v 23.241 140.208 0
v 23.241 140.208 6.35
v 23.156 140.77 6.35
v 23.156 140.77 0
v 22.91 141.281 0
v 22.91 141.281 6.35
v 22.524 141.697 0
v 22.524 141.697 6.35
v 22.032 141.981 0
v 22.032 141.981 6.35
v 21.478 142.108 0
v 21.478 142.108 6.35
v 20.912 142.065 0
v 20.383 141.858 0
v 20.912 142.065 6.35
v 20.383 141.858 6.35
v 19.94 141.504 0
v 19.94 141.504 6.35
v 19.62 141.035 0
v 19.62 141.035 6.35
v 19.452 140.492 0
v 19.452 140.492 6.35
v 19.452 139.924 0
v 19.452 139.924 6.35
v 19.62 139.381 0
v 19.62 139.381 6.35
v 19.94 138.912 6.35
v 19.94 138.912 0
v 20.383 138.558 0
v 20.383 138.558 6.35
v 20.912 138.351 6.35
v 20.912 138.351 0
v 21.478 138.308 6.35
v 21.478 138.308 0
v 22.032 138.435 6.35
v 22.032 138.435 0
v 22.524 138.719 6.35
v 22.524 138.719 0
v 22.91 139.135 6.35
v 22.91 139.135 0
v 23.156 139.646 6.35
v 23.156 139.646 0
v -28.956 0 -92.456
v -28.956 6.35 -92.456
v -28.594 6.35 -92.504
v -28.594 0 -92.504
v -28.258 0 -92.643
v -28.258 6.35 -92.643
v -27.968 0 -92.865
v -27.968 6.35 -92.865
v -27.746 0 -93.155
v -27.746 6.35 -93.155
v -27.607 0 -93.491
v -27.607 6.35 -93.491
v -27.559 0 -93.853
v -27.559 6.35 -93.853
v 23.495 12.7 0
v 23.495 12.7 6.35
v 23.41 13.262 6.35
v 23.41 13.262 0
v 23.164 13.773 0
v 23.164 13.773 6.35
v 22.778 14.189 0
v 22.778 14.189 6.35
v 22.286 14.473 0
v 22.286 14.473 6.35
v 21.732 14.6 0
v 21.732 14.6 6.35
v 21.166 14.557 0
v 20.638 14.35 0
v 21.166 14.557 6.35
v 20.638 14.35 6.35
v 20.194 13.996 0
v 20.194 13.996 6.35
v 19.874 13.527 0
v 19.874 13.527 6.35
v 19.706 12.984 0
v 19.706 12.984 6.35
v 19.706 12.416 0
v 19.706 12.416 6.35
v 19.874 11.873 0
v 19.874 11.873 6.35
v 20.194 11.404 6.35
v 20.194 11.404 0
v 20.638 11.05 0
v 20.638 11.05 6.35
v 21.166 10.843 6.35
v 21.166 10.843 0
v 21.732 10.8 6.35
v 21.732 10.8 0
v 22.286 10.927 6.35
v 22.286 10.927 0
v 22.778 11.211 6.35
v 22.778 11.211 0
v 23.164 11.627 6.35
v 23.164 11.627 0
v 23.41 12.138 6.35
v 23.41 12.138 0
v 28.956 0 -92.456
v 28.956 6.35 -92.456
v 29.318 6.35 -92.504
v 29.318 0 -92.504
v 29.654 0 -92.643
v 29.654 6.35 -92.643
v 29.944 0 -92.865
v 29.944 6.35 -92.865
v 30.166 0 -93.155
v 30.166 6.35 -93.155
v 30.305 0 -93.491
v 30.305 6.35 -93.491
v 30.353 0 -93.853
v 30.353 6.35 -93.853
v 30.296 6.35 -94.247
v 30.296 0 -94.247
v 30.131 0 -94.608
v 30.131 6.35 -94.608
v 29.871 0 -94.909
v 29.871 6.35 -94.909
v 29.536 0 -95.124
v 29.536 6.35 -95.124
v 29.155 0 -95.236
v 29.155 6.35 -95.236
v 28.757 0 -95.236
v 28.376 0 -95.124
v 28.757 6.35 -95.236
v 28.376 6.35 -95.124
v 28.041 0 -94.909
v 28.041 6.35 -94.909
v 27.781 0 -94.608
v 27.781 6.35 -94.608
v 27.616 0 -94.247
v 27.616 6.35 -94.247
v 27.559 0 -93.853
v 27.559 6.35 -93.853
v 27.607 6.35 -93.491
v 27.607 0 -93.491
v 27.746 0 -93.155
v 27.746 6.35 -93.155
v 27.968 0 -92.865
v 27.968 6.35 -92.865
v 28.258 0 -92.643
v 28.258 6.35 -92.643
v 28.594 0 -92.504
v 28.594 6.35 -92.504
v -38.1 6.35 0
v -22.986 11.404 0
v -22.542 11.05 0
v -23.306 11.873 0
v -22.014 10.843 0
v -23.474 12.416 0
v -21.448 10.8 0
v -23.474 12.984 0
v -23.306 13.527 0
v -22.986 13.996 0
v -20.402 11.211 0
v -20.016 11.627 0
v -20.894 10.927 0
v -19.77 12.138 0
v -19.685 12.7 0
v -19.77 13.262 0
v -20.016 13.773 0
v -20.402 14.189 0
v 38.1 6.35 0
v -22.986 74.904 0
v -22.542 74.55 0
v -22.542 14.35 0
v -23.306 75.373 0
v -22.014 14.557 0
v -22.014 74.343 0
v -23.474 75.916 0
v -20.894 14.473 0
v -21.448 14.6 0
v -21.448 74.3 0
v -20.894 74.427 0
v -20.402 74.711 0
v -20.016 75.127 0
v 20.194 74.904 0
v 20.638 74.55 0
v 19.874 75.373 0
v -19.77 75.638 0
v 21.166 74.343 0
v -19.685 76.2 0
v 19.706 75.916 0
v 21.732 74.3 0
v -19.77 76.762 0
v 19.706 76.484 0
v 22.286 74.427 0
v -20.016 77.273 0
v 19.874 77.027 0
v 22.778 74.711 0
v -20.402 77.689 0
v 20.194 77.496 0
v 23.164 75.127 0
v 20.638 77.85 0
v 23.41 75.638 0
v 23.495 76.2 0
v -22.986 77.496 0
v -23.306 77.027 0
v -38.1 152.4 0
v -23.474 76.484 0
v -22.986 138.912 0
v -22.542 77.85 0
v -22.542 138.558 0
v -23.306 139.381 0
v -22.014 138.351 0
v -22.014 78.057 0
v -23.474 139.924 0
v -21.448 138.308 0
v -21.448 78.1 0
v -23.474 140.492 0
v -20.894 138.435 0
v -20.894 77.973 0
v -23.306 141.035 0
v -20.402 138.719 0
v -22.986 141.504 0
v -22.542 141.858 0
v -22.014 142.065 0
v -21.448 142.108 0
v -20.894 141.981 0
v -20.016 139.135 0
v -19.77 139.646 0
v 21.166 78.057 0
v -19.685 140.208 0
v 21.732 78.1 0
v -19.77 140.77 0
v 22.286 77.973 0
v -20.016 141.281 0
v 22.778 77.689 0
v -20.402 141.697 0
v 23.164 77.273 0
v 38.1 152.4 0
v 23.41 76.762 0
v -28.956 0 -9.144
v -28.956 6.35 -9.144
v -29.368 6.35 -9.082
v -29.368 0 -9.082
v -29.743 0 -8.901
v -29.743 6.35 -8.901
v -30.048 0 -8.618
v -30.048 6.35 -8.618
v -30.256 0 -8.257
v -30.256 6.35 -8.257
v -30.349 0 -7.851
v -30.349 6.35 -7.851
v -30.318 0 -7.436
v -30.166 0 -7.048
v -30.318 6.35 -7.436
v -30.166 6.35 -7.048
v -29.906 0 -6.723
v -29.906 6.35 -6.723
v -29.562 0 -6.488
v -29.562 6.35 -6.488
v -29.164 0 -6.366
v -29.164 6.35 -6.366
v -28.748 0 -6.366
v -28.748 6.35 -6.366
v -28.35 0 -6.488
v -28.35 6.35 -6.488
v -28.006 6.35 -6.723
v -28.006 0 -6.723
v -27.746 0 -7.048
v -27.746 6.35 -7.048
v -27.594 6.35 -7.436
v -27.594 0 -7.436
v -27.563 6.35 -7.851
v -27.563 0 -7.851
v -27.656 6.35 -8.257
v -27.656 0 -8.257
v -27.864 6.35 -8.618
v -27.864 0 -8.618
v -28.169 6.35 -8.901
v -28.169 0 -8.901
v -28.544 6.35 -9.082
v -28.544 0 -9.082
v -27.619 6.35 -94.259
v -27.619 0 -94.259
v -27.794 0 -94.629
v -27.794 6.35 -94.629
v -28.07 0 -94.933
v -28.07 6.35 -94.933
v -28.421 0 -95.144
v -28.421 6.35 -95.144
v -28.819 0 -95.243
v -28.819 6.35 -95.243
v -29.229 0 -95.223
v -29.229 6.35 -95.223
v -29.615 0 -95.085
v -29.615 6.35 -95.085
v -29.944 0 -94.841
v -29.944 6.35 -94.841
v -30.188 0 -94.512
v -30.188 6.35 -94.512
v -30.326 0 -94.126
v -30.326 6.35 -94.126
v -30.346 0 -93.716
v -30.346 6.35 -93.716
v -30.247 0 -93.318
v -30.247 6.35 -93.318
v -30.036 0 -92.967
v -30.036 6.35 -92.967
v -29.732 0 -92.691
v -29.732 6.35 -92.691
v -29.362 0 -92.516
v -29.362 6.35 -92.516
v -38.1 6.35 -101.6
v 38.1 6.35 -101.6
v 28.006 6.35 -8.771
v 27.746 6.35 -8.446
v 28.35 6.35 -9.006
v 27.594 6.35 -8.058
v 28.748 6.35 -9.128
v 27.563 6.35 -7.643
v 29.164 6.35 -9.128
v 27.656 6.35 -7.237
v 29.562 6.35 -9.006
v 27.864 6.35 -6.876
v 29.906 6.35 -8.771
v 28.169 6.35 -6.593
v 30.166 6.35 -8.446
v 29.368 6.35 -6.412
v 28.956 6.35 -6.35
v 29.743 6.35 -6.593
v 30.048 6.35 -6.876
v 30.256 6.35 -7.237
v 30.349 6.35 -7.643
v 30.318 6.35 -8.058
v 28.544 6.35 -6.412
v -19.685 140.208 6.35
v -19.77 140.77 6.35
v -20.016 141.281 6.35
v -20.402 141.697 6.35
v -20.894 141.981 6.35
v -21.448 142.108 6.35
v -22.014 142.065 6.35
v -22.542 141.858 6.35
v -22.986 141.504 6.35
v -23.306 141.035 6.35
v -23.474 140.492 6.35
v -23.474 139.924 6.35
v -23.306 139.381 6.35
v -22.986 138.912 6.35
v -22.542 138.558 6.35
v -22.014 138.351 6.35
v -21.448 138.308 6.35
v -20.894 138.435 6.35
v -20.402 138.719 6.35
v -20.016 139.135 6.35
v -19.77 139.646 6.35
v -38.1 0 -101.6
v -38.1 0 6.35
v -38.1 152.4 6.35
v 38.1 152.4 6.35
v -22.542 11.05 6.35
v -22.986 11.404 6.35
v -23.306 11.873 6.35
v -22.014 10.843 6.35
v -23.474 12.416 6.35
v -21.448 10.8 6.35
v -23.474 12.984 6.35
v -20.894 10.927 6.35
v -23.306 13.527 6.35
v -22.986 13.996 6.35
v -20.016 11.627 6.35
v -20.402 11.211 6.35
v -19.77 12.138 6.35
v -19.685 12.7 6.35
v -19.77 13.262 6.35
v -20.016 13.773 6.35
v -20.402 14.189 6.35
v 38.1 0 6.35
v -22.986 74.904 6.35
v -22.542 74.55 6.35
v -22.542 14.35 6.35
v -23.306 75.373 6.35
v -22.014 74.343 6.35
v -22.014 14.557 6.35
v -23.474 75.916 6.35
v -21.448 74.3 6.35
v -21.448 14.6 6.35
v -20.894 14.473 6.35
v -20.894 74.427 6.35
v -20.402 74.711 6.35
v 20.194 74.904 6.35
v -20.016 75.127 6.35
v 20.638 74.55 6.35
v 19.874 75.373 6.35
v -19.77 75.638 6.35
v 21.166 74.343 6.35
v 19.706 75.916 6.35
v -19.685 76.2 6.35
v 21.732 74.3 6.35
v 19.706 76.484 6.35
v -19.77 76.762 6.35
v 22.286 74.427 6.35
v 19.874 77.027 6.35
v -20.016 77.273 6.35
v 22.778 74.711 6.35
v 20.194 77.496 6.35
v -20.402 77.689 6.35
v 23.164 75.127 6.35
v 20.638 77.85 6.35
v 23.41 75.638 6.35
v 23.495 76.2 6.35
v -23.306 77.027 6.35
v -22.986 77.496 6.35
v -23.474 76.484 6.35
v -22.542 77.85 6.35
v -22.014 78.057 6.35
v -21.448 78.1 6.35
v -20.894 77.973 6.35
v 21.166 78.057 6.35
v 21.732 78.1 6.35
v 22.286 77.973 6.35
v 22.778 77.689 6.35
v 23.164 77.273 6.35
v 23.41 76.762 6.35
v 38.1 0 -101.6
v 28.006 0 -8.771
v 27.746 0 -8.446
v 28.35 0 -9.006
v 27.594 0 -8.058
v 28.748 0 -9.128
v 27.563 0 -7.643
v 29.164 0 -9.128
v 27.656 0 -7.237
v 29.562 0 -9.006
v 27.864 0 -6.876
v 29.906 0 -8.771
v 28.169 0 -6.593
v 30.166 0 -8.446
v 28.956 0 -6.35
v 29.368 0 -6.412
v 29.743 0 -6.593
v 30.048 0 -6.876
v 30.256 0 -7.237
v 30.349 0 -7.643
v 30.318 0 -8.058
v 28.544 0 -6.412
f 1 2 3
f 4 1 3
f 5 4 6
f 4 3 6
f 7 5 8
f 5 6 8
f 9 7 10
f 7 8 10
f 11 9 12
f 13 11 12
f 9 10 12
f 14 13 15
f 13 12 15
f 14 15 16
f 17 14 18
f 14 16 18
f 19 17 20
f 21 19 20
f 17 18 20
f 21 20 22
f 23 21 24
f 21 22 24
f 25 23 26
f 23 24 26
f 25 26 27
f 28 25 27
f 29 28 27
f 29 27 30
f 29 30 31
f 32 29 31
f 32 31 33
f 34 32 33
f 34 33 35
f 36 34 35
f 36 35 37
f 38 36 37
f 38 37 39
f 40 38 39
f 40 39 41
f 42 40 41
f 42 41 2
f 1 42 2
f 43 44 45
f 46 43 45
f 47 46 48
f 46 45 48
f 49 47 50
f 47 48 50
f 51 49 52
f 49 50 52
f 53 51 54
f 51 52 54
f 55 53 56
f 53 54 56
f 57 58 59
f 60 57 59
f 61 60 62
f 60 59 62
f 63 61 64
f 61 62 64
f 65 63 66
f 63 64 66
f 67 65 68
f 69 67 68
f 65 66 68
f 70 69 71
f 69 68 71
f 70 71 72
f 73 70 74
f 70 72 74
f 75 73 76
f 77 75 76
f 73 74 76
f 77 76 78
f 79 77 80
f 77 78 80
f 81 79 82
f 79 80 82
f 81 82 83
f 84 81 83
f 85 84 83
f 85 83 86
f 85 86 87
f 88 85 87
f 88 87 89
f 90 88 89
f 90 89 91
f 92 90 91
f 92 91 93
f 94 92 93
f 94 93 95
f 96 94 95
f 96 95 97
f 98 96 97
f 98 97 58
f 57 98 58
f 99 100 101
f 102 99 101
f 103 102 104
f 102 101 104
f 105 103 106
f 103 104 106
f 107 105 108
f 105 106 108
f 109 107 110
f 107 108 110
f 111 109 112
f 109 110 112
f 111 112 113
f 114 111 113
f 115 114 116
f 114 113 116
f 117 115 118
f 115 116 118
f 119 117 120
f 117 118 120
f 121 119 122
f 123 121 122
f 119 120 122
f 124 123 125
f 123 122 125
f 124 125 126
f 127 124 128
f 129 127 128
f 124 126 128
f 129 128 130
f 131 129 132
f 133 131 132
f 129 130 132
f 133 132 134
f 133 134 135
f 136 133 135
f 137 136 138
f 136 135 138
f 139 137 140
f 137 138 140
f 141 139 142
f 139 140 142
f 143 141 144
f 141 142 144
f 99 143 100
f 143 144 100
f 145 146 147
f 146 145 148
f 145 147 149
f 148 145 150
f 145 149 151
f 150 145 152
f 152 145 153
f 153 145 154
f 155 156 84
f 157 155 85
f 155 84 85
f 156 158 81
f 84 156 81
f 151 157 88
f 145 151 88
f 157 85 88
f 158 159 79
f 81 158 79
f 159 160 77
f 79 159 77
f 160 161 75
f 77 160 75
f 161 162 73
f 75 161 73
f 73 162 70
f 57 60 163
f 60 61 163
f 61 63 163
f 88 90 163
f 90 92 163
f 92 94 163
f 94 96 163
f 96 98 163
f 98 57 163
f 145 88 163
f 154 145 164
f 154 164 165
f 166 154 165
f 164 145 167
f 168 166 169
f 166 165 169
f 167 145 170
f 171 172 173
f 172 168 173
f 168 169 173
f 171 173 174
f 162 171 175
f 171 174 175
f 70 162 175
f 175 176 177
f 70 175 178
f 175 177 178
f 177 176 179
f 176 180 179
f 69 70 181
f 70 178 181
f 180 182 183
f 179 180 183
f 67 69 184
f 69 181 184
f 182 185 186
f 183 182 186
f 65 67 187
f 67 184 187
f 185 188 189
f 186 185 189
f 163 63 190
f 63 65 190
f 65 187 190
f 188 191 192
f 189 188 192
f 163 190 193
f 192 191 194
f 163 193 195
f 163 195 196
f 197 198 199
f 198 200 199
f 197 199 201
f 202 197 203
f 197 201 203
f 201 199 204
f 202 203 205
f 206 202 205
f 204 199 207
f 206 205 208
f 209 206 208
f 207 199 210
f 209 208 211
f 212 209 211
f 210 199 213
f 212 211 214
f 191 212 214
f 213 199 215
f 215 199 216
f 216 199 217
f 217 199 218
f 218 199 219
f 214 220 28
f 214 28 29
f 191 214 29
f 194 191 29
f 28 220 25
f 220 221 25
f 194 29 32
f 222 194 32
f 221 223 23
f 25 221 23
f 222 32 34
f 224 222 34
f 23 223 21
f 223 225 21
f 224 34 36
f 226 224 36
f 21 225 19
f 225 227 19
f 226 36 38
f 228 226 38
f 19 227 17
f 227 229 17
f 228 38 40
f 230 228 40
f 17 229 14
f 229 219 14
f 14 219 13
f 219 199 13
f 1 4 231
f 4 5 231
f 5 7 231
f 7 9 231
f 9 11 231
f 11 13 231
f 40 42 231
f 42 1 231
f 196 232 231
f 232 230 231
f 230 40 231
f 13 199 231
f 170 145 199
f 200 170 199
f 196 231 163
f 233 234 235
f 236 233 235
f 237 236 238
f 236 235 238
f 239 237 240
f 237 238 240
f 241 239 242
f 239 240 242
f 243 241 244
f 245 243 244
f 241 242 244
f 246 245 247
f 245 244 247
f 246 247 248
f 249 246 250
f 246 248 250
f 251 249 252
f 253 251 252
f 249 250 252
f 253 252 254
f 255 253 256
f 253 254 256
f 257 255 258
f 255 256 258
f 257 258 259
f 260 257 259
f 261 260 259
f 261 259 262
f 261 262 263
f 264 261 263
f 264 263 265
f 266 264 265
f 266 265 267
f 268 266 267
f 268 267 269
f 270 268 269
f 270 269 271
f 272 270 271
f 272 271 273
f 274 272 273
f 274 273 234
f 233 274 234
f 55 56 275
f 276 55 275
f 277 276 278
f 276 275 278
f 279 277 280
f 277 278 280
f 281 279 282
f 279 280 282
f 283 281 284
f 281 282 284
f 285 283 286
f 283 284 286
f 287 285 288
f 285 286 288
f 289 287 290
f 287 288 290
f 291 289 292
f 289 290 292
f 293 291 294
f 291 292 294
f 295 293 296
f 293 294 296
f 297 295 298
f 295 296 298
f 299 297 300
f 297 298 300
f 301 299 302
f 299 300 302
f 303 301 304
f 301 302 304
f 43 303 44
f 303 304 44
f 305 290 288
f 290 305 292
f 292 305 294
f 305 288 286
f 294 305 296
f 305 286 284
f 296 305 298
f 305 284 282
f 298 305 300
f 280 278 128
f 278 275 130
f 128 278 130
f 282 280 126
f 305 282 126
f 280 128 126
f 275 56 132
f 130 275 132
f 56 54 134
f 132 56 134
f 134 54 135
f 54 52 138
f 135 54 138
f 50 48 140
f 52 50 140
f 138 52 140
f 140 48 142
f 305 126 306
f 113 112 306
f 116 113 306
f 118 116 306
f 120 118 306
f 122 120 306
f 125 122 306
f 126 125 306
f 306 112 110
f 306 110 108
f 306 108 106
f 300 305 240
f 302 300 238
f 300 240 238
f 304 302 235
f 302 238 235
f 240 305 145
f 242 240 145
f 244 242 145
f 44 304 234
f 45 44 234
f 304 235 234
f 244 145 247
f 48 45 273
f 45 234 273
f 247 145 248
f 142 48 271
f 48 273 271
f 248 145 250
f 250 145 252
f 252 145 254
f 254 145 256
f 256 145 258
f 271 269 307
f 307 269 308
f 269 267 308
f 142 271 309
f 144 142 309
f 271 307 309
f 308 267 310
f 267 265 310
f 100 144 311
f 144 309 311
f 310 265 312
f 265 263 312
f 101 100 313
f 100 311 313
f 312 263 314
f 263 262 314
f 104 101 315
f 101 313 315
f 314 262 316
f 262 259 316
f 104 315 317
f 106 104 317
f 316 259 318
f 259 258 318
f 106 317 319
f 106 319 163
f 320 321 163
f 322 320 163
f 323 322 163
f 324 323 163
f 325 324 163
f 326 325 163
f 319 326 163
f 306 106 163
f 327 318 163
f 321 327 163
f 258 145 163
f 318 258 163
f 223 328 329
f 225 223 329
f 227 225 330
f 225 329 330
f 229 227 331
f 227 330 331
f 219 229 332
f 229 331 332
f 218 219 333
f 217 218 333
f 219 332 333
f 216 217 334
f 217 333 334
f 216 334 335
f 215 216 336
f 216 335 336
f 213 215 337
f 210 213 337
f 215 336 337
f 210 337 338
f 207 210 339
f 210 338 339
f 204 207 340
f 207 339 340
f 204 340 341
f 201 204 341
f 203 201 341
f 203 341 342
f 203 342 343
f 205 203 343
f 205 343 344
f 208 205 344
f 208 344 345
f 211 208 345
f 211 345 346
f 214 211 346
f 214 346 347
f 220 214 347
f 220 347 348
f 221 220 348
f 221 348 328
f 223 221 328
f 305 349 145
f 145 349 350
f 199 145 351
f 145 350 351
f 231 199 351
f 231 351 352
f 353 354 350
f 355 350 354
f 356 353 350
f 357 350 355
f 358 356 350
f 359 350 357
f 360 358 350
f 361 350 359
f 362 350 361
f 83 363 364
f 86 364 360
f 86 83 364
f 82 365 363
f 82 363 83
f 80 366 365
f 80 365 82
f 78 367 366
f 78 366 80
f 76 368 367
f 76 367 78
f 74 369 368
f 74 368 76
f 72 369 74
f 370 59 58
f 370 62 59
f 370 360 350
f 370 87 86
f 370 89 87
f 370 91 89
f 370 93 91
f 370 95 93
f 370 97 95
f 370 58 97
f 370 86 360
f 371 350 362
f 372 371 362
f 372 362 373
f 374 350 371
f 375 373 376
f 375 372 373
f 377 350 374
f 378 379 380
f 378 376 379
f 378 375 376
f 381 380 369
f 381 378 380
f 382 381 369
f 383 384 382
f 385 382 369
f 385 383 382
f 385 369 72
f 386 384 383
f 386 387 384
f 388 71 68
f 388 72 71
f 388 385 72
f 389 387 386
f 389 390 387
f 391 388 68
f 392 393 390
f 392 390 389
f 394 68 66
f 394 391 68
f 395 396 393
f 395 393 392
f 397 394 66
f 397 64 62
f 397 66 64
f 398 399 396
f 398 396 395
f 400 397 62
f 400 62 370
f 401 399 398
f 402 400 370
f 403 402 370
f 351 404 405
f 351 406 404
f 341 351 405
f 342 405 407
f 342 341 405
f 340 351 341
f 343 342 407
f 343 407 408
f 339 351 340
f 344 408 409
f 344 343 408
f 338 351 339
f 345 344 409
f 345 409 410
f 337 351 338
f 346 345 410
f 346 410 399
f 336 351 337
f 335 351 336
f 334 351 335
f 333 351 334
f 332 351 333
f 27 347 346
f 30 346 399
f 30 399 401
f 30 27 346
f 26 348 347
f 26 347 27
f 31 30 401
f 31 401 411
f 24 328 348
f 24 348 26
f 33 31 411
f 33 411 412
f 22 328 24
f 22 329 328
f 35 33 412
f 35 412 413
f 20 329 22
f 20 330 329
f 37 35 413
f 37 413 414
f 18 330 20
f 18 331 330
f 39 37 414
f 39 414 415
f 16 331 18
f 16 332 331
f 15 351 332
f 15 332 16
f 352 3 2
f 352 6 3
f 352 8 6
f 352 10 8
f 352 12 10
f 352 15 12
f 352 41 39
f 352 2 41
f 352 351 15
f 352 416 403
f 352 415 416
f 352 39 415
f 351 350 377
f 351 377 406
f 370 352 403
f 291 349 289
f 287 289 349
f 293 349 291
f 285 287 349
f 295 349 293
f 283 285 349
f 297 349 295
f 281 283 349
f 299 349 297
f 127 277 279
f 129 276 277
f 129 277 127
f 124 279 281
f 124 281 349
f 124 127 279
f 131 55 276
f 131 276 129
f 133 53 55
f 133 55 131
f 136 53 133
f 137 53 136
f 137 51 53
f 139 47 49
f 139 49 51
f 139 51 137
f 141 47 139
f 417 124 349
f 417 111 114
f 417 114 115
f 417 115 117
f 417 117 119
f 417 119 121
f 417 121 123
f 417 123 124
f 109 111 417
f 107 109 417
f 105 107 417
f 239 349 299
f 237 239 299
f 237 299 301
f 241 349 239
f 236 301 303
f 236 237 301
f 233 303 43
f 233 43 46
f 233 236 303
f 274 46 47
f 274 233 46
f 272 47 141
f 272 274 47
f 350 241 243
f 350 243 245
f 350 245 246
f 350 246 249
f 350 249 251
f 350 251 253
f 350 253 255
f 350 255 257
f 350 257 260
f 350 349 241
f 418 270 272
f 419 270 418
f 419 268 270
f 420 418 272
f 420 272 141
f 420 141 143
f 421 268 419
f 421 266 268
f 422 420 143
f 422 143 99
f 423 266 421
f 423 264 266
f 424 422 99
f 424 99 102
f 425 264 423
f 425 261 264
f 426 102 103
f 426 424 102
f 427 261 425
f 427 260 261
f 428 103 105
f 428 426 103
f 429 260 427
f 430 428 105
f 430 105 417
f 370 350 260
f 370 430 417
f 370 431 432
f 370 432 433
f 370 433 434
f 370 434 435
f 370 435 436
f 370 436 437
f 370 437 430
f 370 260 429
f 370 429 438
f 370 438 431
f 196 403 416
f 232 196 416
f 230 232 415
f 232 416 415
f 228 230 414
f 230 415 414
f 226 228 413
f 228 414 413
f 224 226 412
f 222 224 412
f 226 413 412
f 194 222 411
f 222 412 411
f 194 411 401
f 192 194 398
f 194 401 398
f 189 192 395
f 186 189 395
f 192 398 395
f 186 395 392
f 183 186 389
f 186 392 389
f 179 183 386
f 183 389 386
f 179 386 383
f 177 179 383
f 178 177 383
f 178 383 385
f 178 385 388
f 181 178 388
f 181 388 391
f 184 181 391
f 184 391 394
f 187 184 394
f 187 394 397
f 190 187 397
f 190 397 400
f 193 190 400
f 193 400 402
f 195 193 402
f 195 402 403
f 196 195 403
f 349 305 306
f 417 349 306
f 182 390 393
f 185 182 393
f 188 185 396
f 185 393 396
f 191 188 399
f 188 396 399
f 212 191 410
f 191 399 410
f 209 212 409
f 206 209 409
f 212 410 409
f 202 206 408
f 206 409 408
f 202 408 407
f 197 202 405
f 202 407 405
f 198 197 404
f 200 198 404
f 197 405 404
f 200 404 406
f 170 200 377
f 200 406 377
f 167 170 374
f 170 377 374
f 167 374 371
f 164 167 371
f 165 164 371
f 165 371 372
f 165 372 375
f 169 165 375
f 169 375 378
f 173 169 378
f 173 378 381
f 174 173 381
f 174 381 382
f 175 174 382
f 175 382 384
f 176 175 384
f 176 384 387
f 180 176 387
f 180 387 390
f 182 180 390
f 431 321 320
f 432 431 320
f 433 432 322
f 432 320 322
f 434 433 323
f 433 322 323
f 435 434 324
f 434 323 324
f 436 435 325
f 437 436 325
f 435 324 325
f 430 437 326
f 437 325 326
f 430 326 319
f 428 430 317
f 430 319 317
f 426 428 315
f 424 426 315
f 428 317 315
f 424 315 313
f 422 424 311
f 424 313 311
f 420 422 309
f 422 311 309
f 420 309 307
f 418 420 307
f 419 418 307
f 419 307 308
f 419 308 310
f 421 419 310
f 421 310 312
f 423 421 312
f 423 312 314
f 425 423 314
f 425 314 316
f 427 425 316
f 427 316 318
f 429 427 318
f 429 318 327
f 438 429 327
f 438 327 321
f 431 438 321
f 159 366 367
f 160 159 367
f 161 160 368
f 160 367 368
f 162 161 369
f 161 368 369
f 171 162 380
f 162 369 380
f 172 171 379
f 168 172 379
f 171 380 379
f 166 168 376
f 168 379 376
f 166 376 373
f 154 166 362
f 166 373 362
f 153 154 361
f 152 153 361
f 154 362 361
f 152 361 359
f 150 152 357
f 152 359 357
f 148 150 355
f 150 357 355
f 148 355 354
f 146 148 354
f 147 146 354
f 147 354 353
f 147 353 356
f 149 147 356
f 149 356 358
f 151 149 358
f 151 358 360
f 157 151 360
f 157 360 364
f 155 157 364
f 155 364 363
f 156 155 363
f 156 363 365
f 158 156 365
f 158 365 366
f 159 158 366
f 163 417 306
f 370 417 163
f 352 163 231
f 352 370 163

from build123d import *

# Parameters (mm, degrees)
SKETCH1_W           = 76.2
SKETCH1_H           = 152.4
BOSS_EXTRUDE1_DEPTH = 6.35
SKETCH3_W           = 76.2
SKETCH3_H           = 6.35
BOSS_EXTRUDE2_DEPTH = 101.6
SKETCH4_R           = 1.905
CUT_EXTRUDE1_DEPTH  = 191.605803952
SKETCH5_R           = 1.397
CUT_EXTRUDE2_DEPTH  = 182.94716953


with BuildPart() as part:
    # Sketch1 → Boss-Extrude1 (new body)
    with BuildSketch(Plane.XY):
        with Locations((0, 76.2)):
            Rectangle(SKETCH1_W, SKETCH1_H)
    extrude(amount=BOSS_EXTRUDE1_DEPTH)

    # Sketch3 → Boss-Extrude2 (add)
    with BuildSketch(Plane.XY):
        with Locations((0, 3.175)):
            Rectangle(SKETCH3_W, SKETCH3_H)
    extrude(amount=-BOSS_EXTRUDE2_DEPTH)

    # Sketch4 → Cut-Extrude1 (cut, through all)
    with BuildSketch(Plane.XY.offset(6.35)):
        with Locations((21.59, 76.2)):
            Circle(SKETCH4_R)
        with Locations((21.59, 12.7)):
            Circle(SKETCH4_R)
        with Locations((-21.59, 12.7)):
            Circle(SKETCH4_R)
        with Locations((-21.59, 76.2)):
            Circle(SKETCH4_R)
        with Locations((21.336, 140.208)):
            Circle(SKETCH4_R)
        with Locations((-21.59, 140.208)):
            Circle(SKETCH4_R)
    extrude(amount=-CUT_EXTRUDE1_DEPTH, mode=Mode.SUBTRACT)

    # Sketch5 → Cut-Extrude2 (cut, through all)
    with BuildSketch(Plane(origin=(0, 6.35, 0), x_dir=(1, 0, 0), z_dir=(0, 1, 0))):
        with BuildLine():
            ThreePointArc((-28.956, 92.456), (-27.968171827, 92.865171827), (-27.559, 93.853))
            Line((-27.559, 93.853), (-28.956, 93.853))
            Line((-28.956, 93.853), (-28.956, 92.456))
        make_face()
        with BuildLine():
            Line((-28.956, 93.853), (-27.559, 93.853))
            ThreePointArc((-27.559, 93.853), (-29.943828173, 94.840828173), (-28.956, 92.456))
            Line((-28.956, 92.456), (-28.956, 93.853))
        make_face()
        with BuildLine():
            ThreePointArc((30.353, 93.853), (28.956, 95.25), (27.559, 93.853))
            Line((27.559, 93.853), (28.956, 93.853))
            Line((28.956, 93.853), (28.956, 92.456))
            ThreePointArc((28.956, 92.456), (29.943828173, 92.865171827), (30.353, 93.853))
        make_face()
        with BuildLine():
            Line((28.956, 93.853), (27.559, 93.853))
            ThreePointArc((27.559, 93.853), (27.968171827, 92.865171827), (28.956, 92.456))
            Line((28.956, 92.456), (28.956, 93.853))
        make_face()
        with Locations(Location((-28.956, 7.747, 0), (0, 0, 90))):
            Circle(SKETCH5_R)
        with Locations(Location((28.956, 7.747, 0), (0, 0, 270))):
            Circle(SKETCH5_R)
    extrude(amount=-CUT_EXTRUDE2_DEPTH, mode=Mode.SUBTRACT)


solid = part.part
